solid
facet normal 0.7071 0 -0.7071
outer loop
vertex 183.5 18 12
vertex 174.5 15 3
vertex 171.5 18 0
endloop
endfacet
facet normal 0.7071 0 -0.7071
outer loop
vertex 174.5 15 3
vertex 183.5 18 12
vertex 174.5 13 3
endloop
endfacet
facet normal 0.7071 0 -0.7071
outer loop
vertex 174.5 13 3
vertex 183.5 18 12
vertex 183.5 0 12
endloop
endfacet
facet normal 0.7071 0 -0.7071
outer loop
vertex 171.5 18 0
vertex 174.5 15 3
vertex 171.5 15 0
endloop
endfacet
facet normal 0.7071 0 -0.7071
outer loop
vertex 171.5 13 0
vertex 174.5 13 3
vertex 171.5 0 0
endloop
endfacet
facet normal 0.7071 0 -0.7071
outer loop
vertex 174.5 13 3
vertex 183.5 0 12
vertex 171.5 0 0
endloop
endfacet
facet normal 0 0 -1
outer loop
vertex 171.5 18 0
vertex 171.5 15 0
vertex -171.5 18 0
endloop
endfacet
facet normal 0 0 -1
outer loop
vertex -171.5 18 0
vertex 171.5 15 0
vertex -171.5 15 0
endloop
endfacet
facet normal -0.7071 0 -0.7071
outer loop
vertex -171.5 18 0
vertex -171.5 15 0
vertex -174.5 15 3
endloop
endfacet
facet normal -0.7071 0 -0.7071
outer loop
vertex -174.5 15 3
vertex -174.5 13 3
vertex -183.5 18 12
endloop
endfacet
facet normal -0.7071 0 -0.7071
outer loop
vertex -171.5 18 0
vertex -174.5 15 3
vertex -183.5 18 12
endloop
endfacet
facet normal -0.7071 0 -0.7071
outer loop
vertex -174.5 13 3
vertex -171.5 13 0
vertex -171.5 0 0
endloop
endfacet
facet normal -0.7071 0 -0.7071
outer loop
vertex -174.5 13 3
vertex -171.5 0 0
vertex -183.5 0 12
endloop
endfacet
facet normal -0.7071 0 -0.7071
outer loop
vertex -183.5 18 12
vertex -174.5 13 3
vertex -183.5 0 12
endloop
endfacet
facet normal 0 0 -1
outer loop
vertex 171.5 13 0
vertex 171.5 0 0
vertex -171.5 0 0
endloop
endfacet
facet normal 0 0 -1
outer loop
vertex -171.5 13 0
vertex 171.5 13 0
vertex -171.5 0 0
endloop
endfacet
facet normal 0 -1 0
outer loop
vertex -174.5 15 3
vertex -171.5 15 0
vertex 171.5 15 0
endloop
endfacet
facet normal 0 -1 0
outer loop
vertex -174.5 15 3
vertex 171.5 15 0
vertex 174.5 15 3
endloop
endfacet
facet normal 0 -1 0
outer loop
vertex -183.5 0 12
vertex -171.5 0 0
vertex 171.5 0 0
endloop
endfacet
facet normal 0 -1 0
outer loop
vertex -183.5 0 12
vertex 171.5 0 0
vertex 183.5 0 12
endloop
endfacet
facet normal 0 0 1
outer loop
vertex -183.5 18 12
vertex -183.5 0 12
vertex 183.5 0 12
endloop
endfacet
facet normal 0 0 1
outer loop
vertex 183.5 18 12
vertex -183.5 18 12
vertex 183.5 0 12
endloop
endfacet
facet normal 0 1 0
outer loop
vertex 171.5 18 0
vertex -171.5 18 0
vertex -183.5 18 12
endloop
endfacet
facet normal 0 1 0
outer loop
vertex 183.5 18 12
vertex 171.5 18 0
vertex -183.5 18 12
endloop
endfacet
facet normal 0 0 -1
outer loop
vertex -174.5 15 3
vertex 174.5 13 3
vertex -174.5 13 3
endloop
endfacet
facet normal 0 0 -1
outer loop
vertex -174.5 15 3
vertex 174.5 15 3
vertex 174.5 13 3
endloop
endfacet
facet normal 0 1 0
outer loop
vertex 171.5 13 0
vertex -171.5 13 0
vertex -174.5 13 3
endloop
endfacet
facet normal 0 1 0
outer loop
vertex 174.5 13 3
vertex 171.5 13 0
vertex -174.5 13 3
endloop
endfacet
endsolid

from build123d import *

# Parameters (mm, degrees)
BOSS_EXTRUDE1_DEPTH = 18
SKETCH2_W           = 28.744942217
SKETCH2_H           = 2
SKETCH2_W_2         = 16.222921702
CUT_EXTRUDE1_DEPTH  = 3


with BuildPart() as part:
    # Sketch1 → Boss-Extrude1 (new body)
    with BuildSketch(Plane(origin=(0, 0, 0), x_dir=(1, 0, 0), z_dir=(0, 1, 0))):
        Polygon((171.5, 0), (0, 0), (0, -12), (183.5, -12), align=None)
        Polygon((0, 0), (-171.5, 0), (-183.5, -12), (0, -12), align=None)
    extrude(amount=BOSS_EXTRUDE1_DEPTH)

    # Sketch2 → Cut-Extrude1 (cut)
    with BuildSketch(Plane(origin=(0, 0, 0), x_dir=(-1, 0, 0), z_dir=(0, 0, -1))):
        Polygon((-148.243209669, 15), (-171.5, 15), (-171.5, 13), (-148.243209669, 13), (143.527924007, 13), (171.5, 13), (171.5, 15), (143.527924007, 15), align=None)
        with Locations((185.872471109, 14)):
            Rectangle(SKETCH2_W, SKETCH2_H)
        with Locations((-179.611460851, 14)):
            Rectangle(SKETCH2_W_2, SKETCH2_H)
    extrude(amount=-CUT_EXTRUDE1_DEPTH, mode=Mode.SUBTRACT)


solid = part.part
